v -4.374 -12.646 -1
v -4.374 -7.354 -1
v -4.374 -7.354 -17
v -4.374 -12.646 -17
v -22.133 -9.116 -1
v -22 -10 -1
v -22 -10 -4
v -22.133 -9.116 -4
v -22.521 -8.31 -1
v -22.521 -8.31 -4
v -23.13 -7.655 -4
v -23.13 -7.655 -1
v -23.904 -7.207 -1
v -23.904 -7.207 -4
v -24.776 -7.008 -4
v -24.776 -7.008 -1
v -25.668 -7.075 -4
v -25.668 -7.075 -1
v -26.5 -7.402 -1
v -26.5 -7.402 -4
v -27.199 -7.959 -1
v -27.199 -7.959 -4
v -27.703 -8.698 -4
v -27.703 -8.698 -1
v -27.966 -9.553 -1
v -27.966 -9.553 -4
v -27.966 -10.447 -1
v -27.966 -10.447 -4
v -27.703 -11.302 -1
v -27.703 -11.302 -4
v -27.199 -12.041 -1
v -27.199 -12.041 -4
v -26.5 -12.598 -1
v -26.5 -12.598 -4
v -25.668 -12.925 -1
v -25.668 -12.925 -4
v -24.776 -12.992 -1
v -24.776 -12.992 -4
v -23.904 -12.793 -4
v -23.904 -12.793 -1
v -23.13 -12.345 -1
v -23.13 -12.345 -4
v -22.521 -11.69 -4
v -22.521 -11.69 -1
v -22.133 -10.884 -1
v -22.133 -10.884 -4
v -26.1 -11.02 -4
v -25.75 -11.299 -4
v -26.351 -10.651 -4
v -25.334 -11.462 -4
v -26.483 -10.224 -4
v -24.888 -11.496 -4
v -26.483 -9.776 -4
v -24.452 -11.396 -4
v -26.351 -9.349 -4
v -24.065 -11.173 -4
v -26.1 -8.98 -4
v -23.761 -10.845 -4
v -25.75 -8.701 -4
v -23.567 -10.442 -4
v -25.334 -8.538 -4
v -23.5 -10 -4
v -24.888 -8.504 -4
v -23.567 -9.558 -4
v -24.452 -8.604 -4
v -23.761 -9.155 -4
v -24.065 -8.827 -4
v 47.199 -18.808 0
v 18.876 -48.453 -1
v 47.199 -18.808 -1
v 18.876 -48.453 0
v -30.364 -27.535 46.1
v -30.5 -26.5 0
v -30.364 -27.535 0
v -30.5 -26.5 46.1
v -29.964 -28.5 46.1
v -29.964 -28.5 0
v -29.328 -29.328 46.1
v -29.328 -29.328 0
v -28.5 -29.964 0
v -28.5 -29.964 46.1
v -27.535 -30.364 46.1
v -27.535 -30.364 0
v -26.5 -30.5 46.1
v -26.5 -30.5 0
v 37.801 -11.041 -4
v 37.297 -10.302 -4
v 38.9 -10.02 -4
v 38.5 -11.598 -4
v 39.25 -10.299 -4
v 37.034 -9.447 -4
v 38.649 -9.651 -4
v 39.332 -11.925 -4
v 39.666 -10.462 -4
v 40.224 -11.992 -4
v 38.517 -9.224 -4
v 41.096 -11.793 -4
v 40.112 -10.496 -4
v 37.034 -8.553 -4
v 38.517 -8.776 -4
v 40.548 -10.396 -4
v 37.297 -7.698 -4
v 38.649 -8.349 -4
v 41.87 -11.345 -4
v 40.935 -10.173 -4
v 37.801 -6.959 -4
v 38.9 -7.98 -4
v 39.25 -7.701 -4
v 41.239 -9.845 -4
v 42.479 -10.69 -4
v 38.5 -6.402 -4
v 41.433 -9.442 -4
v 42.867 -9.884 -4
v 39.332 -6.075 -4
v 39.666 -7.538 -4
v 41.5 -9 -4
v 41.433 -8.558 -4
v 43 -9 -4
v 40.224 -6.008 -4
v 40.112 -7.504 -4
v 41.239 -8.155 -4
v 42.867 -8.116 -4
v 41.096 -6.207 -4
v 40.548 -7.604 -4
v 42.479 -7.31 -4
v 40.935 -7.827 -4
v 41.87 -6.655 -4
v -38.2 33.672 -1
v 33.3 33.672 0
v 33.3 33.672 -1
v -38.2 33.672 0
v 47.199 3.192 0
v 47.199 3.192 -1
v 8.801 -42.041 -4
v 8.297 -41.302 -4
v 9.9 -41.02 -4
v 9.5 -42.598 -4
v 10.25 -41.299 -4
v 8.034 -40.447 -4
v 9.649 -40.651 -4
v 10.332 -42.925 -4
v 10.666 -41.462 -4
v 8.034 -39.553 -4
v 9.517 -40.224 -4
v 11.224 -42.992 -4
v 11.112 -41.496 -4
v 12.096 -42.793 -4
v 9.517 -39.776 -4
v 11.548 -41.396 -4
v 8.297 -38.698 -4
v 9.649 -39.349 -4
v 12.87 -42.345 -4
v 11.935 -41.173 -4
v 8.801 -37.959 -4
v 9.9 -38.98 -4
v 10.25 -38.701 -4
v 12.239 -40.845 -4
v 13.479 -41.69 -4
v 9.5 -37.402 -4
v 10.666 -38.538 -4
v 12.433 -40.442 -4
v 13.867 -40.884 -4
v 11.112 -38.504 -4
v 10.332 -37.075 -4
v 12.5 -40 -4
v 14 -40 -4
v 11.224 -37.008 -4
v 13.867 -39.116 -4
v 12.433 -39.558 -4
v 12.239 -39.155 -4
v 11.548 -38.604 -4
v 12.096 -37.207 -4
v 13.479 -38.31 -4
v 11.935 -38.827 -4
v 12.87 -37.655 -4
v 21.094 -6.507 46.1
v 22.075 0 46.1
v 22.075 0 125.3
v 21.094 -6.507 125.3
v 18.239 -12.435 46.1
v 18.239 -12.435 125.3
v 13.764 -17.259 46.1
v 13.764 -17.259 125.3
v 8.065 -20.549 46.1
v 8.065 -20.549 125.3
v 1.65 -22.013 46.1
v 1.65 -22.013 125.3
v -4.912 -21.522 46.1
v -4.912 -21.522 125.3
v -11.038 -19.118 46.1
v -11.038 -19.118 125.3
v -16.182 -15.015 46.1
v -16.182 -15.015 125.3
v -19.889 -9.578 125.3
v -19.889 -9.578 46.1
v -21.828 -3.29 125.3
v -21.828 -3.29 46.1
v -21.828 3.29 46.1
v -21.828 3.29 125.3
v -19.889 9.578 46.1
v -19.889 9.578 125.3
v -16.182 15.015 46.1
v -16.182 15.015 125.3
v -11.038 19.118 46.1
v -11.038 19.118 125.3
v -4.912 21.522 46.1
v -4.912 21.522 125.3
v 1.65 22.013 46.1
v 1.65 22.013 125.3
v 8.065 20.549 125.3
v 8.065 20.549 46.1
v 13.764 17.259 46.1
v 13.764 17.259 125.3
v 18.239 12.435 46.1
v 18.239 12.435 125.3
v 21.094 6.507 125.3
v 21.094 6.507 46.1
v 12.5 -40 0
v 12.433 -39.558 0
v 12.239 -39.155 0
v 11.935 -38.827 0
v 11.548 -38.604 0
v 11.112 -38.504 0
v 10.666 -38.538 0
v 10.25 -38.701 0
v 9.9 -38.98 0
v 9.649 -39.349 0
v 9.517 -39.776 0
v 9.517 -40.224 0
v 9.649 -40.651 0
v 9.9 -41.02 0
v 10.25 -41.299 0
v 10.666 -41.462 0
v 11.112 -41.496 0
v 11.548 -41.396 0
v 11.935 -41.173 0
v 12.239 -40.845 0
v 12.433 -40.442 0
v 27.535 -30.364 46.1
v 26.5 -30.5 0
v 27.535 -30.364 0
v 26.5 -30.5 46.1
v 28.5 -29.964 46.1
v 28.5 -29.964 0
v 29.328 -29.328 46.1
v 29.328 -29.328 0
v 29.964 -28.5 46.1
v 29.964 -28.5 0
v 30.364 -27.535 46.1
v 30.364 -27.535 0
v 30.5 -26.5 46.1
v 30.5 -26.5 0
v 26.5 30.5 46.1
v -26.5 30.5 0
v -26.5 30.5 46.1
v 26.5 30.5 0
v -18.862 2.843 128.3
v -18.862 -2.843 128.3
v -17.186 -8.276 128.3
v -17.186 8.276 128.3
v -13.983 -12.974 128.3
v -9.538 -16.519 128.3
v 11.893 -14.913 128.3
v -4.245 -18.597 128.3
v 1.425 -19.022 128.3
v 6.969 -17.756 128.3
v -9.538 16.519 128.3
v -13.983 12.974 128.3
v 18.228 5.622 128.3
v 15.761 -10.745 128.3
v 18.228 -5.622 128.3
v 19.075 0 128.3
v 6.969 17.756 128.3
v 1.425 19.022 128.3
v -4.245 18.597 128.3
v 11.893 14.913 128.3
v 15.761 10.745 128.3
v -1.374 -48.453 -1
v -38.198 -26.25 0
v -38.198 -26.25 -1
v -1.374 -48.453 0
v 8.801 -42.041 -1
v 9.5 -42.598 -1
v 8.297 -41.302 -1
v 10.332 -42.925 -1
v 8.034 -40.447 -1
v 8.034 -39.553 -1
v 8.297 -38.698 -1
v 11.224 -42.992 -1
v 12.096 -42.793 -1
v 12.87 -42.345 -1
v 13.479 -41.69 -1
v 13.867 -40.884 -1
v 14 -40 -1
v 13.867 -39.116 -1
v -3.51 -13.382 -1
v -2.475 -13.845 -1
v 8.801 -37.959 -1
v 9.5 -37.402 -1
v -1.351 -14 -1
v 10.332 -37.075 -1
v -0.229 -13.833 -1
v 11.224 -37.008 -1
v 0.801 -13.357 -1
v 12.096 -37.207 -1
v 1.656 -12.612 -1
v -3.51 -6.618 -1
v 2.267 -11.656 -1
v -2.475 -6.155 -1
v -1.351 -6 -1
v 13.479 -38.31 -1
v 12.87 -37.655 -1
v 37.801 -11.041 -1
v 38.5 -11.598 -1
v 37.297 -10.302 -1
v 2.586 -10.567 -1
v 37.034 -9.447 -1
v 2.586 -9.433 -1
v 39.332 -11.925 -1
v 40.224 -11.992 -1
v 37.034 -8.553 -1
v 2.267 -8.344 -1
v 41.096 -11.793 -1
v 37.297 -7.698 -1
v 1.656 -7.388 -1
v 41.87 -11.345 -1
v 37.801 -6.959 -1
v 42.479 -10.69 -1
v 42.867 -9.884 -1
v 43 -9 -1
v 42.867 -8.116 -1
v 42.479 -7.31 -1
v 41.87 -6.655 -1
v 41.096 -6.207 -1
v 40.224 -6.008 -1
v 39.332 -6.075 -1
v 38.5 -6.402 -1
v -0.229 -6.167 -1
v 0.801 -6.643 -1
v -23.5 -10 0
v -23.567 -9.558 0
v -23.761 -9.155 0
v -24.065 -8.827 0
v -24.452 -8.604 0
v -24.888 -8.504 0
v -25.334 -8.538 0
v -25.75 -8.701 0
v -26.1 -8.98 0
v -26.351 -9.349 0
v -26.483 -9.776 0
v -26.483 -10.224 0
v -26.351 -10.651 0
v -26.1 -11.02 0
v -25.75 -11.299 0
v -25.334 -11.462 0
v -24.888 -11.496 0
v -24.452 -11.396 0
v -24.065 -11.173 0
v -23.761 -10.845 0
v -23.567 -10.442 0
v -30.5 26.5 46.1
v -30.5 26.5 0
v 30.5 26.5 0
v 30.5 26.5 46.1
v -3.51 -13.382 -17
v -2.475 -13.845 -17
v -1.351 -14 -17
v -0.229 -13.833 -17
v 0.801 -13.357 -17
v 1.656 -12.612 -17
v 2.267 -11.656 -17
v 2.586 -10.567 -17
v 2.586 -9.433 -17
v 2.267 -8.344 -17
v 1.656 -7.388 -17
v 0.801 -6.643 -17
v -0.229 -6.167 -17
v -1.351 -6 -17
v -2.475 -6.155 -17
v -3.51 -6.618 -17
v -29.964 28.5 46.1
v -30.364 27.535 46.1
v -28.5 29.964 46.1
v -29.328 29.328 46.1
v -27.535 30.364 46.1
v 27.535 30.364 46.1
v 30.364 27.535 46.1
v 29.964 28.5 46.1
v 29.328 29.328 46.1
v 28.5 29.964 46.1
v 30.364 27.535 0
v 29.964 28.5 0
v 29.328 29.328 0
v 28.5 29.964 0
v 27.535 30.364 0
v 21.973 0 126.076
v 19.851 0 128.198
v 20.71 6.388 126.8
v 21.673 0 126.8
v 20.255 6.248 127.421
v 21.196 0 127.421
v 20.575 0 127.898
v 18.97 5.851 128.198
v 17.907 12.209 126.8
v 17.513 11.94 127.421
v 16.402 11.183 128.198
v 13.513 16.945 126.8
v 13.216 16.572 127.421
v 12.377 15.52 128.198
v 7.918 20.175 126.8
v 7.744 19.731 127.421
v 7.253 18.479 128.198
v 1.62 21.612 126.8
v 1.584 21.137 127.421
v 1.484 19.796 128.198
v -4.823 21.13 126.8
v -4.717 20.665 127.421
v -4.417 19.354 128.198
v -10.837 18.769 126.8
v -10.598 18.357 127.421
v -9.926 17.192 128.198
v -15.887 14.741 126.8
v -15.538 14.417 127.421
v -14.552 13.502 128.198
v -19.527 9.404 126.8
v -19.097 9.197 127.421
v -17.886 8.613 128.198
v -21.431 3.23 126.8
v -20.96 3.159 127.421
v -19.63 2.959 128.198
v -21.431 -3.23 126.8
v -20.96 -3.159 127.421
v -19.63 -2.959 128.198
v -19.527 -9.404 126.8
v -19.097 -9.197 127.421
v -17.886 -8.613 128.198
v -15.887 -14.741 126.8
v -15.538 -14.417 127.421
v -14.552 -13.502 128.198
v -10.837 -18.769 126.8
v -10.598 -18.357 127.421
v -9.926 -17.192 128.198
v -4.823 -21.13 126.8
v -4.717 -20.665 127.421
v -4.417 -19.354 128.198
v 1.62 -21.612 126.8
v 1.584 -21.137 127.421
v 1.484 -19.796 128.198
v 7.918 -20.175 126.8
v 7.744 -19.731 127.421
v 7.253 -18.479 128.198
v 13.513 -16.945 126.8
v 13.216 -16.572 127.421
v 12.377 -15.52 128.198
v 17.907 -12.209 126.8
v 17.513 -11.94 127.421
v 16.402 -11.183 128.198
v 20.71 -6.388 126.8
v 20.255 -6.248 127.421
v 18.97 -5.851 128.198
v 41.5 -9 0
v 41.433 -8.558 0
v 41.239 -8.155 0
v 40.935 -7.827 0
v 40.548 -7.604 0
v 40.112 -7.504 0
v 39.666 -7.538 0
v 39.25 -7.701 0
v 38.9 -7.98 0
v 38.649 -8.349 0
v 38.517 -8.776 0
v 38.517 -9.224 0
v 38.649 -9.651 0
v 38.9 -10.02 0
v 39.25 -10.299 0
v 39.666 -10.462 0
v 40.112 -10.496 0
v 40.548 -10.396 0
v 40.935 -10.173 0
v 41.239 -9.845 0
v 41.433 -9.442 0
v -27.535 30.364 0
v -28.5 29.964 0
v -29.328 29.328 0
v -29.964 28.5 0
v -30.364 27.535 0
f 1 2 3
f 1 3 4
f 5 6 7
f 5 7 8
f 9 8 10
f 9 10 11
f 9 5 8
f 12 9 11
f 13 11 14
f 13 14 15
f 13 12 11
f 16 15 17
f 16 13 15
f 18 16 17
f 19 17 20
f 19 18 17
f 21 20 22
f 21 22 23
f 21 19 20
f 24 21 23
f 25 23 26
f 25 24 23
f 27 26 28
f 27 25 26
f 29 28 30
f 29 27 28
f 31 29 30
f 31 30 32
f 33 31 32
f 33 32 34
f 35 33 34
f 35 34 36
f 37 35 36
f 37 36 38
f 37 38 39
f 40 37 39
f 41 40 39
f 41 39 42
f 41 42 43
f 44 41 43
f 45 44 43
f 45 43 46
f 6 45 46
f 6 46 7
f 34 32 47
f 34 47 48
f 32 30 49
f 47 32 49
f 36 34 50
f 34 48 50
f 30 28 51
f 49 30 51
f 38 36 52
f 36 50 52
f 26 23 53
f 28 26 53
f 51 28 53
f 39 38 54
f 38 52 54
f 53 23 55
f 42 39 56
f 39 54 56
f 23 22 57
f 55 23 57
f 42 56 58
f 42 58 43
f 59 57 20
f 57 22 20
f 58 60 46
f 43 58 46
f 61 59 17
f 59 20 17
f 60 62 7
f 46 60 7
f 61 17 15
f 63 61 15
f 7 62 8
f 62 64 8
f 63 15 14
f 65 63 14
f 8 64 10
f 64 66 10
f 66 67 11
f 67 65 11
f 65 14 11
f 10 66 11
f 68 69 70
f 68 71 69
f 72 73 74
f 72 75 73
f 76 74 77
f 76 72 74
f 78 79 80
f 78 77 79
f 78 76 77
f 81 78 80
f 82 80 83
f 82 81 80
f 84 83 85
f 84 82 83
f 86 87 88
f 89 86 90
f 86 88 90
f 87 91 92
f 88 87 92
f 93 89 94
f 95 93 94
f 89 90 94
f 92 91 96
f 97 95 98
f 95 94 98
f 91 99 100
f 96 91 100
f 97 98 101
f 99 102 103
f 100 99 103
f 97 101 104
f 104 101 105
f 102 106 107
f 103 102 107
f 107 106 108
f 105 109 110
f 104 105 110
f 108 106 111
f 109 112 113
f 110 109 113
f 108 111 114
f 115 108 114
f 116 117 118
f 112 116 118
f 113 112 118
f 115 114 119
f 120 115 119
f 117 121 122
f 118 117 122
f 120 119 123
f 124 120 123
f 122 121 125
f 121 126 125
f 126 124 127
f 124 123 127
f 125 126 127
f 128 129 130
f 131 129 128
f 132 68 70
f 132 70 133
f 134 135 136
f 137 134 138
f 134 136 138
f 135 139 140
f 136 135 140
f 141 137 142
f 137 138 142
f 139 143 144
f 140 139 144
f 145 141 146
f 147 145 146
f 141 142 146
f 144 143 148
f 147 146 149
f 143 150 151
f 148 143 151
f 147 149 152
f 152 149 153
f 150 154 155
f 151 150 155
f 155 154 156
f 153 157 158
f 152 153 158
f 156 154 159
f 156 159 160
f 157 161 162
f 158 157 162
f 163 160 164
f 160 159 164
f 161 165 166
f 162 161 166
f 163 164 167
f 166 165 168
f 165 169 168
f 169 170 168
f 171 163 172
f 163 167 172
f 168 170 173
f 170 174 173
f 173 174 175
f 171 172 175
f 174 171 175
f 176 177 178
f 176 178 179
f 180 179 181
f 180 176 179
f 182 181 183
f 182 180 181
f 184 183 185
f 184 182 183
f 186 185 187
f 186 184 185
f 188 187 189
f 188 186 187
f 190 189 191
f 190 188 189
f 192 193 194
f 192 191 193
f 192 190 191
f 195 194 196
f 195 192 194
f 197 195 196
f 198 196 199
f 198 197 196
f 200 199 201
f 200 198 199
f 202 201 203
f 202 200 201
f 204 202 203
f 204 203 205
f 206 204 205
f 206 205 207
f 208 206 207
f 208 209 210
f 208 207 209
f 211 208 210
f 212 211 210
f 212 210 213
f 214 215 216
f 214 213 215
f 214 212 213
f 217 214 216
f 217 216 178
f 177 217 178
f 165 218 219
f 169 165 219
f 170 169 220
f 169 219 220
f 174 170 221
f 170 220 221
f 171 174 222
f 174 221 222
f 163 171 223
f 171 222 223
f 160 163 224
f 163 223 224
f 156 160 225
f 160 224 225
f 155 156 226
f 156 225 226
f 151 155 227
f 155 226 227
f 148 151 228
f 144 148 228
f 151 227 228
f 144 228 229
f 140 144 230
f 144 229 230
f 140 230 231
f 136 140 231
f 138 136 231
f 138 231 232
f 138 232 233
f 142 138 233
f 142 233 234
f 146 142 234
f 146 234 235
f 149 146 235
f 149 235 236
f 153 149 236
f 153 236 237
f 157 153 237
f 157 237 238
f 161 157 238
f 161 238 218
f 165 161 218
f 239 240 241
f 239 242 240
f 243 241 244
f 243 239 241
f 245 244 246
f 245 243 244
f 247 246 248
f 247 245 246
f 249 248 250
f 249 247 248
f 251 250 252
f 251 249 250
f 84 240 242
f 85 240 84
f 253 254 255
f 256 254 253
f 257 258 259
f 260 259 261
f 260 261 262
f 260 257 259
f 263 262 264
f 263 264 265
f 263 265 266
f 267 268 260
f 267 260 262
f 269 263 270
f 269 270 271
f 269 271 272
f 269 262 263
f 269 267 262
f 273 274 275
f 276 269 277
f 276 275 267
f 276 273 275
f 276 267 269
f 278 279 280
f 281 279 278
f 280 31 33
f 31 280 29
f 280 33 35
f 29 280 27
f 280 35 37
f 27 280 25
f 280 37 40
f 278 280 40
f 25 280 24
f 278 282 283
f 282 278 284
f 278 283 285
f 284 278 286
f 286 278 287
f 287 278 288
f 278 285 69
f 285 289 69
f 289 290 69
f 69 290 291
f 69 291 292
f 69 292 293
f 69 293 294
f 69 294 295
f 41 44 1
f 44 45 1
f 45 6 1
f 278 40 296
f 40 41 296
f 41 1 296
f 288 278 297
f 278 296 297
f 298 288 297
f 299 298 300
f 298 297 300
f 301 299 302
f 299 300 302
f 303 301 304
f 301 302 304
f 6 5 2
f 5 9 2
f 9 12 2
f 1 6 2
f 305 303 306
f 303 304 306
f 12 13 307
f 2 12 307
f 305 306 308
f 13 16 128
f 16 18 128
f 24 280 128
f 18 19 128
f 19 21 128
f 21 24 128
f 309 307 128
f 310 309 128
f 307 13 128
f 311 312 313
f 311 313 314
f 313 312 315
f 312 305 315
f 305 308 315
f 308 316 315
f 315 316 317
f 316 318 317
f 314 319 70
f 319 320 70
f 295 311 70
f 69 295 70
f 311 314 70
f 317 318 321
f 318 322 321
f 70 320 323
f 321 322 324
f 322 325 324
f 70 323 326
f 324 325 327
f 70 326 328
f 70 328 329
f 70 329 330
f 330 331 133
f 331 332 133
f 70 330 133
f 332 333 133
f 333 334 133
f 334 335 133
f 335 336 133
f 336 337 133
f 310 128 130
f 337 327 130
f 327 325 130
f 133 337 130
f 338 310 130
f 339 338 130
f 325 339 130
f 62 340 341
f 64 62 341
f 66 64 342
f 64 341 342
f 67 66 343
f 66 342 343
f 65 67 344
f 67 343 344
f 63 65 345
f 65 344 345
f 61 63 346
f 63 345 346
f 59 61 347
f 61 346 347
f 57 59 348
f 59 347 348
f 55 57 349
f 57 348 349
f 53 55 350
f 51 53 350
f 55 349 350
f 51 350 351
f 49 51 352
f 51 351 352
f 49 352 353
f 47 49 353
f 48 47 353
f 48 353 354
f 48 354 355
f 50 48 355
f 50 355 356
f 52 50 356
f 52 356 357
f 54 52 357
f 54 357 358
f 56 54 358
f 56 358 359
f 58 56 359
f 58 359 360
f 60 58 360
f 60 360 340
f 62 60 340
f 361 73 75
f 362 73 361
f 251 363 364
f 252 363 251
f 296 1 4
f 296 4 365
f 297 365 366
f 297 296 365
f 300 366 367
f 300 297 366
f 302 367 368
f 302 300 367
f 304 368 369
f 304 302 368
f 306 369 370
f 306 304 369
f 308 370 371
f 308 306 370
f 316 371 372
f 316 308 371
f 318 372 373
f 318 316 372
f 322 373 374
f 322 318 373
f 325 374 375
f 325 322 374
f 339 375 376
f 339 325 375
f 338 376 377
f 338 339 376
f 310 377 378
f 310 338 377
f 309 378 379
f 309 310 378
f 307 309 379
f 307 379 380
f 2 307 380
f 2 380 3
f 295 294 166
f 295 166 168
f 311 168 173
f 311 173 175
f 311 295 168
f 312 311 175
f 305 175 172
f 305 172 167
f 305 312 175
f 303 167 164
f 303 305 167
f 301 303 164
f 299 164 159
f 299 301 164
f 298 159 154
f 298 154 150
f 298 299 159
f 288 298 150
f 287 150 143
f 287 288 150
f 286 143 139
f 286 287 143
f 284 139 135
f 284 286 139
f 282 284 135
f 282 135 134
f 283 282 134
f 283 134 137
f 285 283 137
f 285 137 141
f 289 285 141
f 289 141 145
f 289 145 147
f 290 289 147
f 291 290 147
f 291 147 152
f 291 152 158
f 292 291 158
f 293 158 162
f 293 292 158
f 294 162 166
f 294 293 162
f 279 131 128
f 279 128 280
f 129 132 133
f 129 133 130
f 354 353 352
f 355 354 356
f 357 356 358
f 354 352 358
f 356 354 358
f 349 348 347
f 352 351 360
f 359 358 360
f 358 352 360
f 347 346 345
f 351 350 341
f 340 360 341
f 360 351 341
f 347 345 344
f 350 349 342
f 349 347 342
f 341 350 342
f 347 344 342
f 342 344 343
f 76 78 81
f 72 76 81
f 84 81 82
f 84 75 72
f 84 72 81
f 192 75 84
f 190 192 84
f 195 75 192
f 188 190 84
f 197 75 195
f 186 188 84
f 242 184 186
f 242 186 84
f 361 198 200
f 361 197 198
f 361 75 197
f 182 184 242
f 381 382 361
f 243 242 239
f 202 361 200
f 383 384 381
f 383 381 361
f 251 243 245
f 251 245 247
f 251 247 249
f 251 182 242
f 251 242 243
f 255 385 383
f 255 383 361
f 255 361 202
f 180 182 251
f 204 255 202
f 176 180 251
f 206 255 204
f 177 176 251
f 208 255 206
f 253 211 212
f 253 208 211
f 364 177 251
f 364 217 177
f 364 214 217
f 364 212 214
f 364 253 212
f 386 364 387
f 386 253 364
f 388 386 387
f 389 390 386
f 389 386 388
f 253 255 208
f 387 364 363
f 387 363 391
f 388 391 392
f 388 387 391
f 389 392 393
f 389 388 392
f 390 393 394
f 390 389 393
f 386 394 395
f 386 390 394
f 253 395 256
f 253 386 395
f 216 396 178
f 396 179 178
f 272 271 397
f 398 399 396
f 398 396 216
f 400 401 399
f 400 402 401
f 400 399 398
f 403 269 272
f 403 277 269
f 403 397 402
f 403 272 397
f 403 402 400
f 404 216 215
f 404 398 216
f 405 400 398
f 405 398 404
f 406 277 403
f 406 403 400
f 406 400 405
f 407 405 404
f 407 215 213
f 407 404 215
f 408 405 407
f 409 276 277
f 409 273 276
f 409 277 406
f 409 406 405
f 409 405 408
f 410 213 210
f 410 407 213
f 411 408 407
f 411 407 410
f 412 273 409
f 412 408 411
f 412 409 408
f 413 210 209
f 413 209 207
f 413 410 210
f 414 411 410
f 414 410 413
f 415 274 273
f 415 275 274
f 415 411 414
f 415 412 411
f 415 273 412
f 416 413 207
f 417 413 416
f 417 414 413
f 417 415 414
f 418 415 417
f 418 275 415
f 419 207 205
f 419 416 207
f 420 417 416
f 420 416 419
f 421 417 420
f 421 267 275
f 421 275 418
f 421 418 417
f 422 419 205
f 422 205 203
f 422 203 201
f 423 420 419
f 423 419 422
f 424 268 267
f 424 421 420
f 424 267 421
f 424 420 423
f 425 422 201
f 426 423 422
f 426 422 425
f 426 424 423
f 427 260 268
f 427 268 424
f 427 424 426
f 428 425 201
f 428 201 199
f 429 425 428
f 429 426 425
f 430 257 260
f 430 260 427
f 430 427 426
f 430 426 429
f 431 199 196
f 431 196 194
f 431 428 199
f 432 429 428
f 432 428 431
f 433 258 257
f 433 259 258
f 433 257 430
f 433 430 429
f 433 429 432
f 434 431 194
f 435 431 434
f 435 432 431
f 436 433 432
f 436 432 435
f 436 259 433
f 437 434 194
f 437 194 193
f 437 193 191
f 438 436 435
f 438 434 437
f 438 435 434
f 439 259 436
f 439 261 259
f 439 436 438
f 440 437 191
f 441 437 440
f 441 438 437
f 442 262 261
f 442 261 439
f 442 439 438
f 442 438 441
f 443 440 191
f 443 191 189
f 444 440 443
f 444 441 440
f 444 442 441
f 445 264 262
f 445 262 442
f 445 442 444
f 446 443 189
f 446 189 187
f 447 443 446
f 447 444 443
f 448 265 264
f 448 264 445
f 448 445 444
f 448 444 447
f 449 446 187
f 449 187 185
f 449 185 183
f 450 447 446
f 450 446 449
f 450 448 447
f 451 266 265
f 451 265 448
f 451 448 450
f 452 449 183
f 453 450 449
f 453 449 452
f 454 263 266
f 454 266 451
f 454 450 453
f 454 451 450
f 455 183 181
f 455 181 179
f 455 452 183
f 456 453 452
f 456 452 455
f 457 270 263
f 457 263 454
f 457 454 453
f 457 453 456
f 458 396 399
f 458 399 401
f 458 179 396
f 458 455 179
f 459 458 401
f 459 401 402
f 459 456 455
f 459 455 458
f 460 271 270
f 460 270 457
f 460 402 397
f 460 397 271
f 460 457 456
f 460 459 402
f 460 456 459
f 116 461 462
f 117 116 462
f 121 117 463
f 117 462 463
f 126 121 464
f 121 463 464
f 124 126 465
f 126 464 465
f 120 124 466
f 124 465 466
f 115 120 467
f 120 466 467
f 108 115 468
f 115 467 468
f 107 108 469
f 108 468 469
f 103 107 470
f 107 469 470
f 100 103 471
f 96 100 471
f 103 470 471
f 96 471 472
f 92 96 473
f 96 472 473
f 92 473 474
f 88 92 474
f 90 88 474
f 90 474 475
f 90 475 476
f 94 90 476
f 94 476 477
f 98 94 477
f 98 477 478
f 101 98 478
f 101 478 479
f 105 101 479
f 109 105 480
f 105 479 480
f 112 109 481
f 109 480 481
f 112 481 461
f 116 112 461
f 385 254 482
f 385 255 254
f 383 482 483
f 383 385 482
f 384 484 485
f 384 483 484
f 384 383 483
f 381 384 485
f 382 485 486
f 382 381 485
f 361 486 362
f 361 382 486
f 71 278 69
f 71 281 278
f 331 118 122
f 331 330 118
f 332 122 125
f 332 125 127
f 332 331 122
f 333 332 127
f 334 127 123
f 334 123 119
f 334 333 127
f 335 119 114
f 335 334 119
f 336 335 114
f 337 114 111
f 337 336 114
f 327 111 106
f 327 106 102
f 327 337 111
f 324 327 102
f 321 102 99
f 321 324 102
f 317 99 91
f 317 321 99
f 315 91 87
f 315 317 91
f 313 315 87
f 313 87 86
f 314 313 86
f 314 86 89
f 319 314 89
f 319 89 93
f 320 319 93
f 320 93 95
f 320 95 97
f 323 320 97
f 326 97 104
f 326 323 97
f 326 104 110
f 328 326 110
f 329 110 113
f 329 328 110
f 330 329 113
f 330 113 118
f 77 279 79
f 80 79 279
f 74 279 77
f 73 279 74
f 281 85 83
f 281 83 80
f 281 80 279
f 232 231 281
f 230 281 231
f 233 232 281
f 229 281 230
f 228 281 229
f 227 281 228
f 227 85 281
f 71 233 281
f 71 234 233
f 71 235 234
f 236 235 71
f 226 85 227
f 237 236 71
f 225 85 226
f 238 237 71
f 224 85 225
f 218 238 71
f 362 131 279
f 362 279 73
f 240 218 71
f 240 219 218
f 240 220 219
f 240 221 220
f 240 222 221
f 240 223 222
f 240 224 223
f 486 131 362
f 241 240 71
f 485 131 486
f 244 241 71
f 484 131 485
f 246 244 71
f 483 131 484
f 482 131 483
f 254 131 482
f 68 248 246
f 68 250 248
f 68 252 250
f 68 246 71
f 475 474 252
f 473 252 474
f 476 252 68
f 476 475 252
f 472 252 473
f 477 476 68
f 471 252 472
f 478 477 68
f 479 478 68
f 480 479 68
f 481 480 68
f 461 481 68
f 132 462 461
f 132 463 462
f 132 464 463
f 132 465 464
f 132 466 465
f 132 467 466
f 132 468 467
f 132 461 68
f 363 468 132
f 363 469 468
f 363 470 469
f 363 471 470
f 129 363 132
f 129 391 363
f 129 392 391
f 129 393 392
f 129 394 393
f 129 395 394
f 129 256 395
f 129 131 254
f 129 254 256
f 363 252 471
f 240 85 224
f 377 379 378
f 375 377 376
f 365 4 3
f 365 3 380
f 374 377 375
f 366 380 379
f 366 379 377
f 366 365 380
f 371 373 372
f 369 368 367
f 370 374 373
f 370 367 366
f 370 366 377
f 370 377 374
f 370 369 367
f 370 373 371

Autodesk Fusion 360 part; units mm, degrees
sketch "Esboço1" plane through (0, 0, 0) normal (0, 0, 1) x (1, 0, 0)
  line L0 (30.5, -30.5) -> (-30.5, -30.5)
  line L1 (-30.5, -30.5) -> (-30.5, 30.5)
  line L2 (-30.5, 30.5) -> (30.5, 30.5)
  line L3 (30.5, 30.5) -> (30.5, -30.5)
  line L4 (30.5, -30.5) -> (-30.5, 30.5) construction
  line L5 (-30.5, -30.5) -> (30.5, 30.5) construction
  circle A0 centre (0, 0) radius 22.075
  dimension "d1" = 61
  dimension "d2" = 44.15
extrude "Extrusão1" add sketch "Esboço1" along normal blind 46.1
extrude "Extrusão2" add sketch "Esboço1" along normal blind 128.3 contours A0
fillet "Arredondamento1" radius 4 4 edges at (30.5, -30.5, 23.05) (30.5, 30.5, 23.05) (-30.5, 30.5, 23.05) (-30.5, -30.5, 23.05)
fillet "Arredondamento2" radius 3 1 edges at (-20.5811, -7.9827, 128.3)
sketch "Esboço3" plane through (0, 0, 0) normal (0, 0, 1) x (1, 0, 0)
sketch "Esboço4" plane through (0, 0, 0) normal (0, 0, 1) x (1, 0, 0)
  line L0 (-38.1983, -26.2505) -> (-1.3738, -48.4531)
  line L1 (-1.3738, -48.4531) -> (18.8762, -48.4531)
  line L2 (18.8762, -48.4531) -> (47.1993, -18.8085)
  line L3 (47.1993, -18.8085) -> (47.1993, 3.1915)
  line L4 (47.1993, 3.1915) -> (33.3001, 33.6725)
  line L5 (33.3001, 33.6725) -> (-38.1999, 33.6725)
  line L6 (-38.1999, 33.6725) -> (-38.1983, -26.2505)
  circle A0 centre (-25, -10) radius 1.5
  circle A1 centre (11, -40) radius 1.5
  circle A2 centre (40, -9) radius 1.5
  circle A3 centre (11, -40) radius 3
  circle A4 centre (40, -9) radius 3
  circle A5 centre (-25, -10) radius 3
  dimension "d25" = 3
  dimension "d26" = 3
  dimension "d27" = 3
  dimension "d28" = 20.25
  dimension "d29" = 43
  dimension "d30" = 71.5
  dimension "d31" = 33.5004
  dimension "d32" = 22
  dimension "d33" = 41
  dimension "d38" = 6
  dimension "d39" = 6
  dimension "d40" = 6
extrude "Extrusão5" add sketch "Esboço4" against normal blind 1 contours L0 L1 L2 L3 L4 L5 L6 | A3 | A4 | A5
extrude "Extrusão6" add sketch "Esboço4" against normal blind 4 contours A3 | A4 | A5
sketch "Esboço5" plane through (0, 0, -1) normal (0, 0, -1) x (1, 0, 0)
  circle A0 centre (40, 9) radius 3
  circle A1 centre (-25, 10) radius 3
  circle A2 centre (11, 40) radius 3
  line L0 (-38.1983, 26.2505) -> (-38.1999, -33.6725)
  line L1 (-38.1999, -33.6725) -> (33.3001, -33.6725)
  line L2 (33.3001, -33.6725) -> (47.1993, -3.1915)
  line L3 (47.1993, -3.1915) -> (47.1993, 18.8085)
  line L4 (47.1993, 18.8085) -> (18.8762, 48.4531)
  line L5 (18.8762, 48.4531) -> (-1.3738, 48.4531)
  line L6 (-1.3738, 48.4531) -> (-38.1983, 26.2505)
  line L7 (-1.3738, 48.4531) -> (-1.3738, 10) construction
  line L8 (-1.3738, 10) -> (-25, 10) construction
  line L9 (-5.3738, 10) -> (-4.3738, 10) construction
  line L10 (-4.3738, 10) -> (-4.3738, 7.3542)
  line L11 (-4.3738, 10) -> (-4.3738, 12.6458)
  arc A3 (-4.3738, 7.3542) -> (-4.3738, 12.6458) centre (-1.3738, 10) ccw
  dimension "d47" = 8
  dimension "d48" = 1
extrude "Extrusão8" add sketch "Esboço5" along normal blind 16 contours L10 L11 A3
equation "d5 = 46.1 mm + 82.2 mm"
